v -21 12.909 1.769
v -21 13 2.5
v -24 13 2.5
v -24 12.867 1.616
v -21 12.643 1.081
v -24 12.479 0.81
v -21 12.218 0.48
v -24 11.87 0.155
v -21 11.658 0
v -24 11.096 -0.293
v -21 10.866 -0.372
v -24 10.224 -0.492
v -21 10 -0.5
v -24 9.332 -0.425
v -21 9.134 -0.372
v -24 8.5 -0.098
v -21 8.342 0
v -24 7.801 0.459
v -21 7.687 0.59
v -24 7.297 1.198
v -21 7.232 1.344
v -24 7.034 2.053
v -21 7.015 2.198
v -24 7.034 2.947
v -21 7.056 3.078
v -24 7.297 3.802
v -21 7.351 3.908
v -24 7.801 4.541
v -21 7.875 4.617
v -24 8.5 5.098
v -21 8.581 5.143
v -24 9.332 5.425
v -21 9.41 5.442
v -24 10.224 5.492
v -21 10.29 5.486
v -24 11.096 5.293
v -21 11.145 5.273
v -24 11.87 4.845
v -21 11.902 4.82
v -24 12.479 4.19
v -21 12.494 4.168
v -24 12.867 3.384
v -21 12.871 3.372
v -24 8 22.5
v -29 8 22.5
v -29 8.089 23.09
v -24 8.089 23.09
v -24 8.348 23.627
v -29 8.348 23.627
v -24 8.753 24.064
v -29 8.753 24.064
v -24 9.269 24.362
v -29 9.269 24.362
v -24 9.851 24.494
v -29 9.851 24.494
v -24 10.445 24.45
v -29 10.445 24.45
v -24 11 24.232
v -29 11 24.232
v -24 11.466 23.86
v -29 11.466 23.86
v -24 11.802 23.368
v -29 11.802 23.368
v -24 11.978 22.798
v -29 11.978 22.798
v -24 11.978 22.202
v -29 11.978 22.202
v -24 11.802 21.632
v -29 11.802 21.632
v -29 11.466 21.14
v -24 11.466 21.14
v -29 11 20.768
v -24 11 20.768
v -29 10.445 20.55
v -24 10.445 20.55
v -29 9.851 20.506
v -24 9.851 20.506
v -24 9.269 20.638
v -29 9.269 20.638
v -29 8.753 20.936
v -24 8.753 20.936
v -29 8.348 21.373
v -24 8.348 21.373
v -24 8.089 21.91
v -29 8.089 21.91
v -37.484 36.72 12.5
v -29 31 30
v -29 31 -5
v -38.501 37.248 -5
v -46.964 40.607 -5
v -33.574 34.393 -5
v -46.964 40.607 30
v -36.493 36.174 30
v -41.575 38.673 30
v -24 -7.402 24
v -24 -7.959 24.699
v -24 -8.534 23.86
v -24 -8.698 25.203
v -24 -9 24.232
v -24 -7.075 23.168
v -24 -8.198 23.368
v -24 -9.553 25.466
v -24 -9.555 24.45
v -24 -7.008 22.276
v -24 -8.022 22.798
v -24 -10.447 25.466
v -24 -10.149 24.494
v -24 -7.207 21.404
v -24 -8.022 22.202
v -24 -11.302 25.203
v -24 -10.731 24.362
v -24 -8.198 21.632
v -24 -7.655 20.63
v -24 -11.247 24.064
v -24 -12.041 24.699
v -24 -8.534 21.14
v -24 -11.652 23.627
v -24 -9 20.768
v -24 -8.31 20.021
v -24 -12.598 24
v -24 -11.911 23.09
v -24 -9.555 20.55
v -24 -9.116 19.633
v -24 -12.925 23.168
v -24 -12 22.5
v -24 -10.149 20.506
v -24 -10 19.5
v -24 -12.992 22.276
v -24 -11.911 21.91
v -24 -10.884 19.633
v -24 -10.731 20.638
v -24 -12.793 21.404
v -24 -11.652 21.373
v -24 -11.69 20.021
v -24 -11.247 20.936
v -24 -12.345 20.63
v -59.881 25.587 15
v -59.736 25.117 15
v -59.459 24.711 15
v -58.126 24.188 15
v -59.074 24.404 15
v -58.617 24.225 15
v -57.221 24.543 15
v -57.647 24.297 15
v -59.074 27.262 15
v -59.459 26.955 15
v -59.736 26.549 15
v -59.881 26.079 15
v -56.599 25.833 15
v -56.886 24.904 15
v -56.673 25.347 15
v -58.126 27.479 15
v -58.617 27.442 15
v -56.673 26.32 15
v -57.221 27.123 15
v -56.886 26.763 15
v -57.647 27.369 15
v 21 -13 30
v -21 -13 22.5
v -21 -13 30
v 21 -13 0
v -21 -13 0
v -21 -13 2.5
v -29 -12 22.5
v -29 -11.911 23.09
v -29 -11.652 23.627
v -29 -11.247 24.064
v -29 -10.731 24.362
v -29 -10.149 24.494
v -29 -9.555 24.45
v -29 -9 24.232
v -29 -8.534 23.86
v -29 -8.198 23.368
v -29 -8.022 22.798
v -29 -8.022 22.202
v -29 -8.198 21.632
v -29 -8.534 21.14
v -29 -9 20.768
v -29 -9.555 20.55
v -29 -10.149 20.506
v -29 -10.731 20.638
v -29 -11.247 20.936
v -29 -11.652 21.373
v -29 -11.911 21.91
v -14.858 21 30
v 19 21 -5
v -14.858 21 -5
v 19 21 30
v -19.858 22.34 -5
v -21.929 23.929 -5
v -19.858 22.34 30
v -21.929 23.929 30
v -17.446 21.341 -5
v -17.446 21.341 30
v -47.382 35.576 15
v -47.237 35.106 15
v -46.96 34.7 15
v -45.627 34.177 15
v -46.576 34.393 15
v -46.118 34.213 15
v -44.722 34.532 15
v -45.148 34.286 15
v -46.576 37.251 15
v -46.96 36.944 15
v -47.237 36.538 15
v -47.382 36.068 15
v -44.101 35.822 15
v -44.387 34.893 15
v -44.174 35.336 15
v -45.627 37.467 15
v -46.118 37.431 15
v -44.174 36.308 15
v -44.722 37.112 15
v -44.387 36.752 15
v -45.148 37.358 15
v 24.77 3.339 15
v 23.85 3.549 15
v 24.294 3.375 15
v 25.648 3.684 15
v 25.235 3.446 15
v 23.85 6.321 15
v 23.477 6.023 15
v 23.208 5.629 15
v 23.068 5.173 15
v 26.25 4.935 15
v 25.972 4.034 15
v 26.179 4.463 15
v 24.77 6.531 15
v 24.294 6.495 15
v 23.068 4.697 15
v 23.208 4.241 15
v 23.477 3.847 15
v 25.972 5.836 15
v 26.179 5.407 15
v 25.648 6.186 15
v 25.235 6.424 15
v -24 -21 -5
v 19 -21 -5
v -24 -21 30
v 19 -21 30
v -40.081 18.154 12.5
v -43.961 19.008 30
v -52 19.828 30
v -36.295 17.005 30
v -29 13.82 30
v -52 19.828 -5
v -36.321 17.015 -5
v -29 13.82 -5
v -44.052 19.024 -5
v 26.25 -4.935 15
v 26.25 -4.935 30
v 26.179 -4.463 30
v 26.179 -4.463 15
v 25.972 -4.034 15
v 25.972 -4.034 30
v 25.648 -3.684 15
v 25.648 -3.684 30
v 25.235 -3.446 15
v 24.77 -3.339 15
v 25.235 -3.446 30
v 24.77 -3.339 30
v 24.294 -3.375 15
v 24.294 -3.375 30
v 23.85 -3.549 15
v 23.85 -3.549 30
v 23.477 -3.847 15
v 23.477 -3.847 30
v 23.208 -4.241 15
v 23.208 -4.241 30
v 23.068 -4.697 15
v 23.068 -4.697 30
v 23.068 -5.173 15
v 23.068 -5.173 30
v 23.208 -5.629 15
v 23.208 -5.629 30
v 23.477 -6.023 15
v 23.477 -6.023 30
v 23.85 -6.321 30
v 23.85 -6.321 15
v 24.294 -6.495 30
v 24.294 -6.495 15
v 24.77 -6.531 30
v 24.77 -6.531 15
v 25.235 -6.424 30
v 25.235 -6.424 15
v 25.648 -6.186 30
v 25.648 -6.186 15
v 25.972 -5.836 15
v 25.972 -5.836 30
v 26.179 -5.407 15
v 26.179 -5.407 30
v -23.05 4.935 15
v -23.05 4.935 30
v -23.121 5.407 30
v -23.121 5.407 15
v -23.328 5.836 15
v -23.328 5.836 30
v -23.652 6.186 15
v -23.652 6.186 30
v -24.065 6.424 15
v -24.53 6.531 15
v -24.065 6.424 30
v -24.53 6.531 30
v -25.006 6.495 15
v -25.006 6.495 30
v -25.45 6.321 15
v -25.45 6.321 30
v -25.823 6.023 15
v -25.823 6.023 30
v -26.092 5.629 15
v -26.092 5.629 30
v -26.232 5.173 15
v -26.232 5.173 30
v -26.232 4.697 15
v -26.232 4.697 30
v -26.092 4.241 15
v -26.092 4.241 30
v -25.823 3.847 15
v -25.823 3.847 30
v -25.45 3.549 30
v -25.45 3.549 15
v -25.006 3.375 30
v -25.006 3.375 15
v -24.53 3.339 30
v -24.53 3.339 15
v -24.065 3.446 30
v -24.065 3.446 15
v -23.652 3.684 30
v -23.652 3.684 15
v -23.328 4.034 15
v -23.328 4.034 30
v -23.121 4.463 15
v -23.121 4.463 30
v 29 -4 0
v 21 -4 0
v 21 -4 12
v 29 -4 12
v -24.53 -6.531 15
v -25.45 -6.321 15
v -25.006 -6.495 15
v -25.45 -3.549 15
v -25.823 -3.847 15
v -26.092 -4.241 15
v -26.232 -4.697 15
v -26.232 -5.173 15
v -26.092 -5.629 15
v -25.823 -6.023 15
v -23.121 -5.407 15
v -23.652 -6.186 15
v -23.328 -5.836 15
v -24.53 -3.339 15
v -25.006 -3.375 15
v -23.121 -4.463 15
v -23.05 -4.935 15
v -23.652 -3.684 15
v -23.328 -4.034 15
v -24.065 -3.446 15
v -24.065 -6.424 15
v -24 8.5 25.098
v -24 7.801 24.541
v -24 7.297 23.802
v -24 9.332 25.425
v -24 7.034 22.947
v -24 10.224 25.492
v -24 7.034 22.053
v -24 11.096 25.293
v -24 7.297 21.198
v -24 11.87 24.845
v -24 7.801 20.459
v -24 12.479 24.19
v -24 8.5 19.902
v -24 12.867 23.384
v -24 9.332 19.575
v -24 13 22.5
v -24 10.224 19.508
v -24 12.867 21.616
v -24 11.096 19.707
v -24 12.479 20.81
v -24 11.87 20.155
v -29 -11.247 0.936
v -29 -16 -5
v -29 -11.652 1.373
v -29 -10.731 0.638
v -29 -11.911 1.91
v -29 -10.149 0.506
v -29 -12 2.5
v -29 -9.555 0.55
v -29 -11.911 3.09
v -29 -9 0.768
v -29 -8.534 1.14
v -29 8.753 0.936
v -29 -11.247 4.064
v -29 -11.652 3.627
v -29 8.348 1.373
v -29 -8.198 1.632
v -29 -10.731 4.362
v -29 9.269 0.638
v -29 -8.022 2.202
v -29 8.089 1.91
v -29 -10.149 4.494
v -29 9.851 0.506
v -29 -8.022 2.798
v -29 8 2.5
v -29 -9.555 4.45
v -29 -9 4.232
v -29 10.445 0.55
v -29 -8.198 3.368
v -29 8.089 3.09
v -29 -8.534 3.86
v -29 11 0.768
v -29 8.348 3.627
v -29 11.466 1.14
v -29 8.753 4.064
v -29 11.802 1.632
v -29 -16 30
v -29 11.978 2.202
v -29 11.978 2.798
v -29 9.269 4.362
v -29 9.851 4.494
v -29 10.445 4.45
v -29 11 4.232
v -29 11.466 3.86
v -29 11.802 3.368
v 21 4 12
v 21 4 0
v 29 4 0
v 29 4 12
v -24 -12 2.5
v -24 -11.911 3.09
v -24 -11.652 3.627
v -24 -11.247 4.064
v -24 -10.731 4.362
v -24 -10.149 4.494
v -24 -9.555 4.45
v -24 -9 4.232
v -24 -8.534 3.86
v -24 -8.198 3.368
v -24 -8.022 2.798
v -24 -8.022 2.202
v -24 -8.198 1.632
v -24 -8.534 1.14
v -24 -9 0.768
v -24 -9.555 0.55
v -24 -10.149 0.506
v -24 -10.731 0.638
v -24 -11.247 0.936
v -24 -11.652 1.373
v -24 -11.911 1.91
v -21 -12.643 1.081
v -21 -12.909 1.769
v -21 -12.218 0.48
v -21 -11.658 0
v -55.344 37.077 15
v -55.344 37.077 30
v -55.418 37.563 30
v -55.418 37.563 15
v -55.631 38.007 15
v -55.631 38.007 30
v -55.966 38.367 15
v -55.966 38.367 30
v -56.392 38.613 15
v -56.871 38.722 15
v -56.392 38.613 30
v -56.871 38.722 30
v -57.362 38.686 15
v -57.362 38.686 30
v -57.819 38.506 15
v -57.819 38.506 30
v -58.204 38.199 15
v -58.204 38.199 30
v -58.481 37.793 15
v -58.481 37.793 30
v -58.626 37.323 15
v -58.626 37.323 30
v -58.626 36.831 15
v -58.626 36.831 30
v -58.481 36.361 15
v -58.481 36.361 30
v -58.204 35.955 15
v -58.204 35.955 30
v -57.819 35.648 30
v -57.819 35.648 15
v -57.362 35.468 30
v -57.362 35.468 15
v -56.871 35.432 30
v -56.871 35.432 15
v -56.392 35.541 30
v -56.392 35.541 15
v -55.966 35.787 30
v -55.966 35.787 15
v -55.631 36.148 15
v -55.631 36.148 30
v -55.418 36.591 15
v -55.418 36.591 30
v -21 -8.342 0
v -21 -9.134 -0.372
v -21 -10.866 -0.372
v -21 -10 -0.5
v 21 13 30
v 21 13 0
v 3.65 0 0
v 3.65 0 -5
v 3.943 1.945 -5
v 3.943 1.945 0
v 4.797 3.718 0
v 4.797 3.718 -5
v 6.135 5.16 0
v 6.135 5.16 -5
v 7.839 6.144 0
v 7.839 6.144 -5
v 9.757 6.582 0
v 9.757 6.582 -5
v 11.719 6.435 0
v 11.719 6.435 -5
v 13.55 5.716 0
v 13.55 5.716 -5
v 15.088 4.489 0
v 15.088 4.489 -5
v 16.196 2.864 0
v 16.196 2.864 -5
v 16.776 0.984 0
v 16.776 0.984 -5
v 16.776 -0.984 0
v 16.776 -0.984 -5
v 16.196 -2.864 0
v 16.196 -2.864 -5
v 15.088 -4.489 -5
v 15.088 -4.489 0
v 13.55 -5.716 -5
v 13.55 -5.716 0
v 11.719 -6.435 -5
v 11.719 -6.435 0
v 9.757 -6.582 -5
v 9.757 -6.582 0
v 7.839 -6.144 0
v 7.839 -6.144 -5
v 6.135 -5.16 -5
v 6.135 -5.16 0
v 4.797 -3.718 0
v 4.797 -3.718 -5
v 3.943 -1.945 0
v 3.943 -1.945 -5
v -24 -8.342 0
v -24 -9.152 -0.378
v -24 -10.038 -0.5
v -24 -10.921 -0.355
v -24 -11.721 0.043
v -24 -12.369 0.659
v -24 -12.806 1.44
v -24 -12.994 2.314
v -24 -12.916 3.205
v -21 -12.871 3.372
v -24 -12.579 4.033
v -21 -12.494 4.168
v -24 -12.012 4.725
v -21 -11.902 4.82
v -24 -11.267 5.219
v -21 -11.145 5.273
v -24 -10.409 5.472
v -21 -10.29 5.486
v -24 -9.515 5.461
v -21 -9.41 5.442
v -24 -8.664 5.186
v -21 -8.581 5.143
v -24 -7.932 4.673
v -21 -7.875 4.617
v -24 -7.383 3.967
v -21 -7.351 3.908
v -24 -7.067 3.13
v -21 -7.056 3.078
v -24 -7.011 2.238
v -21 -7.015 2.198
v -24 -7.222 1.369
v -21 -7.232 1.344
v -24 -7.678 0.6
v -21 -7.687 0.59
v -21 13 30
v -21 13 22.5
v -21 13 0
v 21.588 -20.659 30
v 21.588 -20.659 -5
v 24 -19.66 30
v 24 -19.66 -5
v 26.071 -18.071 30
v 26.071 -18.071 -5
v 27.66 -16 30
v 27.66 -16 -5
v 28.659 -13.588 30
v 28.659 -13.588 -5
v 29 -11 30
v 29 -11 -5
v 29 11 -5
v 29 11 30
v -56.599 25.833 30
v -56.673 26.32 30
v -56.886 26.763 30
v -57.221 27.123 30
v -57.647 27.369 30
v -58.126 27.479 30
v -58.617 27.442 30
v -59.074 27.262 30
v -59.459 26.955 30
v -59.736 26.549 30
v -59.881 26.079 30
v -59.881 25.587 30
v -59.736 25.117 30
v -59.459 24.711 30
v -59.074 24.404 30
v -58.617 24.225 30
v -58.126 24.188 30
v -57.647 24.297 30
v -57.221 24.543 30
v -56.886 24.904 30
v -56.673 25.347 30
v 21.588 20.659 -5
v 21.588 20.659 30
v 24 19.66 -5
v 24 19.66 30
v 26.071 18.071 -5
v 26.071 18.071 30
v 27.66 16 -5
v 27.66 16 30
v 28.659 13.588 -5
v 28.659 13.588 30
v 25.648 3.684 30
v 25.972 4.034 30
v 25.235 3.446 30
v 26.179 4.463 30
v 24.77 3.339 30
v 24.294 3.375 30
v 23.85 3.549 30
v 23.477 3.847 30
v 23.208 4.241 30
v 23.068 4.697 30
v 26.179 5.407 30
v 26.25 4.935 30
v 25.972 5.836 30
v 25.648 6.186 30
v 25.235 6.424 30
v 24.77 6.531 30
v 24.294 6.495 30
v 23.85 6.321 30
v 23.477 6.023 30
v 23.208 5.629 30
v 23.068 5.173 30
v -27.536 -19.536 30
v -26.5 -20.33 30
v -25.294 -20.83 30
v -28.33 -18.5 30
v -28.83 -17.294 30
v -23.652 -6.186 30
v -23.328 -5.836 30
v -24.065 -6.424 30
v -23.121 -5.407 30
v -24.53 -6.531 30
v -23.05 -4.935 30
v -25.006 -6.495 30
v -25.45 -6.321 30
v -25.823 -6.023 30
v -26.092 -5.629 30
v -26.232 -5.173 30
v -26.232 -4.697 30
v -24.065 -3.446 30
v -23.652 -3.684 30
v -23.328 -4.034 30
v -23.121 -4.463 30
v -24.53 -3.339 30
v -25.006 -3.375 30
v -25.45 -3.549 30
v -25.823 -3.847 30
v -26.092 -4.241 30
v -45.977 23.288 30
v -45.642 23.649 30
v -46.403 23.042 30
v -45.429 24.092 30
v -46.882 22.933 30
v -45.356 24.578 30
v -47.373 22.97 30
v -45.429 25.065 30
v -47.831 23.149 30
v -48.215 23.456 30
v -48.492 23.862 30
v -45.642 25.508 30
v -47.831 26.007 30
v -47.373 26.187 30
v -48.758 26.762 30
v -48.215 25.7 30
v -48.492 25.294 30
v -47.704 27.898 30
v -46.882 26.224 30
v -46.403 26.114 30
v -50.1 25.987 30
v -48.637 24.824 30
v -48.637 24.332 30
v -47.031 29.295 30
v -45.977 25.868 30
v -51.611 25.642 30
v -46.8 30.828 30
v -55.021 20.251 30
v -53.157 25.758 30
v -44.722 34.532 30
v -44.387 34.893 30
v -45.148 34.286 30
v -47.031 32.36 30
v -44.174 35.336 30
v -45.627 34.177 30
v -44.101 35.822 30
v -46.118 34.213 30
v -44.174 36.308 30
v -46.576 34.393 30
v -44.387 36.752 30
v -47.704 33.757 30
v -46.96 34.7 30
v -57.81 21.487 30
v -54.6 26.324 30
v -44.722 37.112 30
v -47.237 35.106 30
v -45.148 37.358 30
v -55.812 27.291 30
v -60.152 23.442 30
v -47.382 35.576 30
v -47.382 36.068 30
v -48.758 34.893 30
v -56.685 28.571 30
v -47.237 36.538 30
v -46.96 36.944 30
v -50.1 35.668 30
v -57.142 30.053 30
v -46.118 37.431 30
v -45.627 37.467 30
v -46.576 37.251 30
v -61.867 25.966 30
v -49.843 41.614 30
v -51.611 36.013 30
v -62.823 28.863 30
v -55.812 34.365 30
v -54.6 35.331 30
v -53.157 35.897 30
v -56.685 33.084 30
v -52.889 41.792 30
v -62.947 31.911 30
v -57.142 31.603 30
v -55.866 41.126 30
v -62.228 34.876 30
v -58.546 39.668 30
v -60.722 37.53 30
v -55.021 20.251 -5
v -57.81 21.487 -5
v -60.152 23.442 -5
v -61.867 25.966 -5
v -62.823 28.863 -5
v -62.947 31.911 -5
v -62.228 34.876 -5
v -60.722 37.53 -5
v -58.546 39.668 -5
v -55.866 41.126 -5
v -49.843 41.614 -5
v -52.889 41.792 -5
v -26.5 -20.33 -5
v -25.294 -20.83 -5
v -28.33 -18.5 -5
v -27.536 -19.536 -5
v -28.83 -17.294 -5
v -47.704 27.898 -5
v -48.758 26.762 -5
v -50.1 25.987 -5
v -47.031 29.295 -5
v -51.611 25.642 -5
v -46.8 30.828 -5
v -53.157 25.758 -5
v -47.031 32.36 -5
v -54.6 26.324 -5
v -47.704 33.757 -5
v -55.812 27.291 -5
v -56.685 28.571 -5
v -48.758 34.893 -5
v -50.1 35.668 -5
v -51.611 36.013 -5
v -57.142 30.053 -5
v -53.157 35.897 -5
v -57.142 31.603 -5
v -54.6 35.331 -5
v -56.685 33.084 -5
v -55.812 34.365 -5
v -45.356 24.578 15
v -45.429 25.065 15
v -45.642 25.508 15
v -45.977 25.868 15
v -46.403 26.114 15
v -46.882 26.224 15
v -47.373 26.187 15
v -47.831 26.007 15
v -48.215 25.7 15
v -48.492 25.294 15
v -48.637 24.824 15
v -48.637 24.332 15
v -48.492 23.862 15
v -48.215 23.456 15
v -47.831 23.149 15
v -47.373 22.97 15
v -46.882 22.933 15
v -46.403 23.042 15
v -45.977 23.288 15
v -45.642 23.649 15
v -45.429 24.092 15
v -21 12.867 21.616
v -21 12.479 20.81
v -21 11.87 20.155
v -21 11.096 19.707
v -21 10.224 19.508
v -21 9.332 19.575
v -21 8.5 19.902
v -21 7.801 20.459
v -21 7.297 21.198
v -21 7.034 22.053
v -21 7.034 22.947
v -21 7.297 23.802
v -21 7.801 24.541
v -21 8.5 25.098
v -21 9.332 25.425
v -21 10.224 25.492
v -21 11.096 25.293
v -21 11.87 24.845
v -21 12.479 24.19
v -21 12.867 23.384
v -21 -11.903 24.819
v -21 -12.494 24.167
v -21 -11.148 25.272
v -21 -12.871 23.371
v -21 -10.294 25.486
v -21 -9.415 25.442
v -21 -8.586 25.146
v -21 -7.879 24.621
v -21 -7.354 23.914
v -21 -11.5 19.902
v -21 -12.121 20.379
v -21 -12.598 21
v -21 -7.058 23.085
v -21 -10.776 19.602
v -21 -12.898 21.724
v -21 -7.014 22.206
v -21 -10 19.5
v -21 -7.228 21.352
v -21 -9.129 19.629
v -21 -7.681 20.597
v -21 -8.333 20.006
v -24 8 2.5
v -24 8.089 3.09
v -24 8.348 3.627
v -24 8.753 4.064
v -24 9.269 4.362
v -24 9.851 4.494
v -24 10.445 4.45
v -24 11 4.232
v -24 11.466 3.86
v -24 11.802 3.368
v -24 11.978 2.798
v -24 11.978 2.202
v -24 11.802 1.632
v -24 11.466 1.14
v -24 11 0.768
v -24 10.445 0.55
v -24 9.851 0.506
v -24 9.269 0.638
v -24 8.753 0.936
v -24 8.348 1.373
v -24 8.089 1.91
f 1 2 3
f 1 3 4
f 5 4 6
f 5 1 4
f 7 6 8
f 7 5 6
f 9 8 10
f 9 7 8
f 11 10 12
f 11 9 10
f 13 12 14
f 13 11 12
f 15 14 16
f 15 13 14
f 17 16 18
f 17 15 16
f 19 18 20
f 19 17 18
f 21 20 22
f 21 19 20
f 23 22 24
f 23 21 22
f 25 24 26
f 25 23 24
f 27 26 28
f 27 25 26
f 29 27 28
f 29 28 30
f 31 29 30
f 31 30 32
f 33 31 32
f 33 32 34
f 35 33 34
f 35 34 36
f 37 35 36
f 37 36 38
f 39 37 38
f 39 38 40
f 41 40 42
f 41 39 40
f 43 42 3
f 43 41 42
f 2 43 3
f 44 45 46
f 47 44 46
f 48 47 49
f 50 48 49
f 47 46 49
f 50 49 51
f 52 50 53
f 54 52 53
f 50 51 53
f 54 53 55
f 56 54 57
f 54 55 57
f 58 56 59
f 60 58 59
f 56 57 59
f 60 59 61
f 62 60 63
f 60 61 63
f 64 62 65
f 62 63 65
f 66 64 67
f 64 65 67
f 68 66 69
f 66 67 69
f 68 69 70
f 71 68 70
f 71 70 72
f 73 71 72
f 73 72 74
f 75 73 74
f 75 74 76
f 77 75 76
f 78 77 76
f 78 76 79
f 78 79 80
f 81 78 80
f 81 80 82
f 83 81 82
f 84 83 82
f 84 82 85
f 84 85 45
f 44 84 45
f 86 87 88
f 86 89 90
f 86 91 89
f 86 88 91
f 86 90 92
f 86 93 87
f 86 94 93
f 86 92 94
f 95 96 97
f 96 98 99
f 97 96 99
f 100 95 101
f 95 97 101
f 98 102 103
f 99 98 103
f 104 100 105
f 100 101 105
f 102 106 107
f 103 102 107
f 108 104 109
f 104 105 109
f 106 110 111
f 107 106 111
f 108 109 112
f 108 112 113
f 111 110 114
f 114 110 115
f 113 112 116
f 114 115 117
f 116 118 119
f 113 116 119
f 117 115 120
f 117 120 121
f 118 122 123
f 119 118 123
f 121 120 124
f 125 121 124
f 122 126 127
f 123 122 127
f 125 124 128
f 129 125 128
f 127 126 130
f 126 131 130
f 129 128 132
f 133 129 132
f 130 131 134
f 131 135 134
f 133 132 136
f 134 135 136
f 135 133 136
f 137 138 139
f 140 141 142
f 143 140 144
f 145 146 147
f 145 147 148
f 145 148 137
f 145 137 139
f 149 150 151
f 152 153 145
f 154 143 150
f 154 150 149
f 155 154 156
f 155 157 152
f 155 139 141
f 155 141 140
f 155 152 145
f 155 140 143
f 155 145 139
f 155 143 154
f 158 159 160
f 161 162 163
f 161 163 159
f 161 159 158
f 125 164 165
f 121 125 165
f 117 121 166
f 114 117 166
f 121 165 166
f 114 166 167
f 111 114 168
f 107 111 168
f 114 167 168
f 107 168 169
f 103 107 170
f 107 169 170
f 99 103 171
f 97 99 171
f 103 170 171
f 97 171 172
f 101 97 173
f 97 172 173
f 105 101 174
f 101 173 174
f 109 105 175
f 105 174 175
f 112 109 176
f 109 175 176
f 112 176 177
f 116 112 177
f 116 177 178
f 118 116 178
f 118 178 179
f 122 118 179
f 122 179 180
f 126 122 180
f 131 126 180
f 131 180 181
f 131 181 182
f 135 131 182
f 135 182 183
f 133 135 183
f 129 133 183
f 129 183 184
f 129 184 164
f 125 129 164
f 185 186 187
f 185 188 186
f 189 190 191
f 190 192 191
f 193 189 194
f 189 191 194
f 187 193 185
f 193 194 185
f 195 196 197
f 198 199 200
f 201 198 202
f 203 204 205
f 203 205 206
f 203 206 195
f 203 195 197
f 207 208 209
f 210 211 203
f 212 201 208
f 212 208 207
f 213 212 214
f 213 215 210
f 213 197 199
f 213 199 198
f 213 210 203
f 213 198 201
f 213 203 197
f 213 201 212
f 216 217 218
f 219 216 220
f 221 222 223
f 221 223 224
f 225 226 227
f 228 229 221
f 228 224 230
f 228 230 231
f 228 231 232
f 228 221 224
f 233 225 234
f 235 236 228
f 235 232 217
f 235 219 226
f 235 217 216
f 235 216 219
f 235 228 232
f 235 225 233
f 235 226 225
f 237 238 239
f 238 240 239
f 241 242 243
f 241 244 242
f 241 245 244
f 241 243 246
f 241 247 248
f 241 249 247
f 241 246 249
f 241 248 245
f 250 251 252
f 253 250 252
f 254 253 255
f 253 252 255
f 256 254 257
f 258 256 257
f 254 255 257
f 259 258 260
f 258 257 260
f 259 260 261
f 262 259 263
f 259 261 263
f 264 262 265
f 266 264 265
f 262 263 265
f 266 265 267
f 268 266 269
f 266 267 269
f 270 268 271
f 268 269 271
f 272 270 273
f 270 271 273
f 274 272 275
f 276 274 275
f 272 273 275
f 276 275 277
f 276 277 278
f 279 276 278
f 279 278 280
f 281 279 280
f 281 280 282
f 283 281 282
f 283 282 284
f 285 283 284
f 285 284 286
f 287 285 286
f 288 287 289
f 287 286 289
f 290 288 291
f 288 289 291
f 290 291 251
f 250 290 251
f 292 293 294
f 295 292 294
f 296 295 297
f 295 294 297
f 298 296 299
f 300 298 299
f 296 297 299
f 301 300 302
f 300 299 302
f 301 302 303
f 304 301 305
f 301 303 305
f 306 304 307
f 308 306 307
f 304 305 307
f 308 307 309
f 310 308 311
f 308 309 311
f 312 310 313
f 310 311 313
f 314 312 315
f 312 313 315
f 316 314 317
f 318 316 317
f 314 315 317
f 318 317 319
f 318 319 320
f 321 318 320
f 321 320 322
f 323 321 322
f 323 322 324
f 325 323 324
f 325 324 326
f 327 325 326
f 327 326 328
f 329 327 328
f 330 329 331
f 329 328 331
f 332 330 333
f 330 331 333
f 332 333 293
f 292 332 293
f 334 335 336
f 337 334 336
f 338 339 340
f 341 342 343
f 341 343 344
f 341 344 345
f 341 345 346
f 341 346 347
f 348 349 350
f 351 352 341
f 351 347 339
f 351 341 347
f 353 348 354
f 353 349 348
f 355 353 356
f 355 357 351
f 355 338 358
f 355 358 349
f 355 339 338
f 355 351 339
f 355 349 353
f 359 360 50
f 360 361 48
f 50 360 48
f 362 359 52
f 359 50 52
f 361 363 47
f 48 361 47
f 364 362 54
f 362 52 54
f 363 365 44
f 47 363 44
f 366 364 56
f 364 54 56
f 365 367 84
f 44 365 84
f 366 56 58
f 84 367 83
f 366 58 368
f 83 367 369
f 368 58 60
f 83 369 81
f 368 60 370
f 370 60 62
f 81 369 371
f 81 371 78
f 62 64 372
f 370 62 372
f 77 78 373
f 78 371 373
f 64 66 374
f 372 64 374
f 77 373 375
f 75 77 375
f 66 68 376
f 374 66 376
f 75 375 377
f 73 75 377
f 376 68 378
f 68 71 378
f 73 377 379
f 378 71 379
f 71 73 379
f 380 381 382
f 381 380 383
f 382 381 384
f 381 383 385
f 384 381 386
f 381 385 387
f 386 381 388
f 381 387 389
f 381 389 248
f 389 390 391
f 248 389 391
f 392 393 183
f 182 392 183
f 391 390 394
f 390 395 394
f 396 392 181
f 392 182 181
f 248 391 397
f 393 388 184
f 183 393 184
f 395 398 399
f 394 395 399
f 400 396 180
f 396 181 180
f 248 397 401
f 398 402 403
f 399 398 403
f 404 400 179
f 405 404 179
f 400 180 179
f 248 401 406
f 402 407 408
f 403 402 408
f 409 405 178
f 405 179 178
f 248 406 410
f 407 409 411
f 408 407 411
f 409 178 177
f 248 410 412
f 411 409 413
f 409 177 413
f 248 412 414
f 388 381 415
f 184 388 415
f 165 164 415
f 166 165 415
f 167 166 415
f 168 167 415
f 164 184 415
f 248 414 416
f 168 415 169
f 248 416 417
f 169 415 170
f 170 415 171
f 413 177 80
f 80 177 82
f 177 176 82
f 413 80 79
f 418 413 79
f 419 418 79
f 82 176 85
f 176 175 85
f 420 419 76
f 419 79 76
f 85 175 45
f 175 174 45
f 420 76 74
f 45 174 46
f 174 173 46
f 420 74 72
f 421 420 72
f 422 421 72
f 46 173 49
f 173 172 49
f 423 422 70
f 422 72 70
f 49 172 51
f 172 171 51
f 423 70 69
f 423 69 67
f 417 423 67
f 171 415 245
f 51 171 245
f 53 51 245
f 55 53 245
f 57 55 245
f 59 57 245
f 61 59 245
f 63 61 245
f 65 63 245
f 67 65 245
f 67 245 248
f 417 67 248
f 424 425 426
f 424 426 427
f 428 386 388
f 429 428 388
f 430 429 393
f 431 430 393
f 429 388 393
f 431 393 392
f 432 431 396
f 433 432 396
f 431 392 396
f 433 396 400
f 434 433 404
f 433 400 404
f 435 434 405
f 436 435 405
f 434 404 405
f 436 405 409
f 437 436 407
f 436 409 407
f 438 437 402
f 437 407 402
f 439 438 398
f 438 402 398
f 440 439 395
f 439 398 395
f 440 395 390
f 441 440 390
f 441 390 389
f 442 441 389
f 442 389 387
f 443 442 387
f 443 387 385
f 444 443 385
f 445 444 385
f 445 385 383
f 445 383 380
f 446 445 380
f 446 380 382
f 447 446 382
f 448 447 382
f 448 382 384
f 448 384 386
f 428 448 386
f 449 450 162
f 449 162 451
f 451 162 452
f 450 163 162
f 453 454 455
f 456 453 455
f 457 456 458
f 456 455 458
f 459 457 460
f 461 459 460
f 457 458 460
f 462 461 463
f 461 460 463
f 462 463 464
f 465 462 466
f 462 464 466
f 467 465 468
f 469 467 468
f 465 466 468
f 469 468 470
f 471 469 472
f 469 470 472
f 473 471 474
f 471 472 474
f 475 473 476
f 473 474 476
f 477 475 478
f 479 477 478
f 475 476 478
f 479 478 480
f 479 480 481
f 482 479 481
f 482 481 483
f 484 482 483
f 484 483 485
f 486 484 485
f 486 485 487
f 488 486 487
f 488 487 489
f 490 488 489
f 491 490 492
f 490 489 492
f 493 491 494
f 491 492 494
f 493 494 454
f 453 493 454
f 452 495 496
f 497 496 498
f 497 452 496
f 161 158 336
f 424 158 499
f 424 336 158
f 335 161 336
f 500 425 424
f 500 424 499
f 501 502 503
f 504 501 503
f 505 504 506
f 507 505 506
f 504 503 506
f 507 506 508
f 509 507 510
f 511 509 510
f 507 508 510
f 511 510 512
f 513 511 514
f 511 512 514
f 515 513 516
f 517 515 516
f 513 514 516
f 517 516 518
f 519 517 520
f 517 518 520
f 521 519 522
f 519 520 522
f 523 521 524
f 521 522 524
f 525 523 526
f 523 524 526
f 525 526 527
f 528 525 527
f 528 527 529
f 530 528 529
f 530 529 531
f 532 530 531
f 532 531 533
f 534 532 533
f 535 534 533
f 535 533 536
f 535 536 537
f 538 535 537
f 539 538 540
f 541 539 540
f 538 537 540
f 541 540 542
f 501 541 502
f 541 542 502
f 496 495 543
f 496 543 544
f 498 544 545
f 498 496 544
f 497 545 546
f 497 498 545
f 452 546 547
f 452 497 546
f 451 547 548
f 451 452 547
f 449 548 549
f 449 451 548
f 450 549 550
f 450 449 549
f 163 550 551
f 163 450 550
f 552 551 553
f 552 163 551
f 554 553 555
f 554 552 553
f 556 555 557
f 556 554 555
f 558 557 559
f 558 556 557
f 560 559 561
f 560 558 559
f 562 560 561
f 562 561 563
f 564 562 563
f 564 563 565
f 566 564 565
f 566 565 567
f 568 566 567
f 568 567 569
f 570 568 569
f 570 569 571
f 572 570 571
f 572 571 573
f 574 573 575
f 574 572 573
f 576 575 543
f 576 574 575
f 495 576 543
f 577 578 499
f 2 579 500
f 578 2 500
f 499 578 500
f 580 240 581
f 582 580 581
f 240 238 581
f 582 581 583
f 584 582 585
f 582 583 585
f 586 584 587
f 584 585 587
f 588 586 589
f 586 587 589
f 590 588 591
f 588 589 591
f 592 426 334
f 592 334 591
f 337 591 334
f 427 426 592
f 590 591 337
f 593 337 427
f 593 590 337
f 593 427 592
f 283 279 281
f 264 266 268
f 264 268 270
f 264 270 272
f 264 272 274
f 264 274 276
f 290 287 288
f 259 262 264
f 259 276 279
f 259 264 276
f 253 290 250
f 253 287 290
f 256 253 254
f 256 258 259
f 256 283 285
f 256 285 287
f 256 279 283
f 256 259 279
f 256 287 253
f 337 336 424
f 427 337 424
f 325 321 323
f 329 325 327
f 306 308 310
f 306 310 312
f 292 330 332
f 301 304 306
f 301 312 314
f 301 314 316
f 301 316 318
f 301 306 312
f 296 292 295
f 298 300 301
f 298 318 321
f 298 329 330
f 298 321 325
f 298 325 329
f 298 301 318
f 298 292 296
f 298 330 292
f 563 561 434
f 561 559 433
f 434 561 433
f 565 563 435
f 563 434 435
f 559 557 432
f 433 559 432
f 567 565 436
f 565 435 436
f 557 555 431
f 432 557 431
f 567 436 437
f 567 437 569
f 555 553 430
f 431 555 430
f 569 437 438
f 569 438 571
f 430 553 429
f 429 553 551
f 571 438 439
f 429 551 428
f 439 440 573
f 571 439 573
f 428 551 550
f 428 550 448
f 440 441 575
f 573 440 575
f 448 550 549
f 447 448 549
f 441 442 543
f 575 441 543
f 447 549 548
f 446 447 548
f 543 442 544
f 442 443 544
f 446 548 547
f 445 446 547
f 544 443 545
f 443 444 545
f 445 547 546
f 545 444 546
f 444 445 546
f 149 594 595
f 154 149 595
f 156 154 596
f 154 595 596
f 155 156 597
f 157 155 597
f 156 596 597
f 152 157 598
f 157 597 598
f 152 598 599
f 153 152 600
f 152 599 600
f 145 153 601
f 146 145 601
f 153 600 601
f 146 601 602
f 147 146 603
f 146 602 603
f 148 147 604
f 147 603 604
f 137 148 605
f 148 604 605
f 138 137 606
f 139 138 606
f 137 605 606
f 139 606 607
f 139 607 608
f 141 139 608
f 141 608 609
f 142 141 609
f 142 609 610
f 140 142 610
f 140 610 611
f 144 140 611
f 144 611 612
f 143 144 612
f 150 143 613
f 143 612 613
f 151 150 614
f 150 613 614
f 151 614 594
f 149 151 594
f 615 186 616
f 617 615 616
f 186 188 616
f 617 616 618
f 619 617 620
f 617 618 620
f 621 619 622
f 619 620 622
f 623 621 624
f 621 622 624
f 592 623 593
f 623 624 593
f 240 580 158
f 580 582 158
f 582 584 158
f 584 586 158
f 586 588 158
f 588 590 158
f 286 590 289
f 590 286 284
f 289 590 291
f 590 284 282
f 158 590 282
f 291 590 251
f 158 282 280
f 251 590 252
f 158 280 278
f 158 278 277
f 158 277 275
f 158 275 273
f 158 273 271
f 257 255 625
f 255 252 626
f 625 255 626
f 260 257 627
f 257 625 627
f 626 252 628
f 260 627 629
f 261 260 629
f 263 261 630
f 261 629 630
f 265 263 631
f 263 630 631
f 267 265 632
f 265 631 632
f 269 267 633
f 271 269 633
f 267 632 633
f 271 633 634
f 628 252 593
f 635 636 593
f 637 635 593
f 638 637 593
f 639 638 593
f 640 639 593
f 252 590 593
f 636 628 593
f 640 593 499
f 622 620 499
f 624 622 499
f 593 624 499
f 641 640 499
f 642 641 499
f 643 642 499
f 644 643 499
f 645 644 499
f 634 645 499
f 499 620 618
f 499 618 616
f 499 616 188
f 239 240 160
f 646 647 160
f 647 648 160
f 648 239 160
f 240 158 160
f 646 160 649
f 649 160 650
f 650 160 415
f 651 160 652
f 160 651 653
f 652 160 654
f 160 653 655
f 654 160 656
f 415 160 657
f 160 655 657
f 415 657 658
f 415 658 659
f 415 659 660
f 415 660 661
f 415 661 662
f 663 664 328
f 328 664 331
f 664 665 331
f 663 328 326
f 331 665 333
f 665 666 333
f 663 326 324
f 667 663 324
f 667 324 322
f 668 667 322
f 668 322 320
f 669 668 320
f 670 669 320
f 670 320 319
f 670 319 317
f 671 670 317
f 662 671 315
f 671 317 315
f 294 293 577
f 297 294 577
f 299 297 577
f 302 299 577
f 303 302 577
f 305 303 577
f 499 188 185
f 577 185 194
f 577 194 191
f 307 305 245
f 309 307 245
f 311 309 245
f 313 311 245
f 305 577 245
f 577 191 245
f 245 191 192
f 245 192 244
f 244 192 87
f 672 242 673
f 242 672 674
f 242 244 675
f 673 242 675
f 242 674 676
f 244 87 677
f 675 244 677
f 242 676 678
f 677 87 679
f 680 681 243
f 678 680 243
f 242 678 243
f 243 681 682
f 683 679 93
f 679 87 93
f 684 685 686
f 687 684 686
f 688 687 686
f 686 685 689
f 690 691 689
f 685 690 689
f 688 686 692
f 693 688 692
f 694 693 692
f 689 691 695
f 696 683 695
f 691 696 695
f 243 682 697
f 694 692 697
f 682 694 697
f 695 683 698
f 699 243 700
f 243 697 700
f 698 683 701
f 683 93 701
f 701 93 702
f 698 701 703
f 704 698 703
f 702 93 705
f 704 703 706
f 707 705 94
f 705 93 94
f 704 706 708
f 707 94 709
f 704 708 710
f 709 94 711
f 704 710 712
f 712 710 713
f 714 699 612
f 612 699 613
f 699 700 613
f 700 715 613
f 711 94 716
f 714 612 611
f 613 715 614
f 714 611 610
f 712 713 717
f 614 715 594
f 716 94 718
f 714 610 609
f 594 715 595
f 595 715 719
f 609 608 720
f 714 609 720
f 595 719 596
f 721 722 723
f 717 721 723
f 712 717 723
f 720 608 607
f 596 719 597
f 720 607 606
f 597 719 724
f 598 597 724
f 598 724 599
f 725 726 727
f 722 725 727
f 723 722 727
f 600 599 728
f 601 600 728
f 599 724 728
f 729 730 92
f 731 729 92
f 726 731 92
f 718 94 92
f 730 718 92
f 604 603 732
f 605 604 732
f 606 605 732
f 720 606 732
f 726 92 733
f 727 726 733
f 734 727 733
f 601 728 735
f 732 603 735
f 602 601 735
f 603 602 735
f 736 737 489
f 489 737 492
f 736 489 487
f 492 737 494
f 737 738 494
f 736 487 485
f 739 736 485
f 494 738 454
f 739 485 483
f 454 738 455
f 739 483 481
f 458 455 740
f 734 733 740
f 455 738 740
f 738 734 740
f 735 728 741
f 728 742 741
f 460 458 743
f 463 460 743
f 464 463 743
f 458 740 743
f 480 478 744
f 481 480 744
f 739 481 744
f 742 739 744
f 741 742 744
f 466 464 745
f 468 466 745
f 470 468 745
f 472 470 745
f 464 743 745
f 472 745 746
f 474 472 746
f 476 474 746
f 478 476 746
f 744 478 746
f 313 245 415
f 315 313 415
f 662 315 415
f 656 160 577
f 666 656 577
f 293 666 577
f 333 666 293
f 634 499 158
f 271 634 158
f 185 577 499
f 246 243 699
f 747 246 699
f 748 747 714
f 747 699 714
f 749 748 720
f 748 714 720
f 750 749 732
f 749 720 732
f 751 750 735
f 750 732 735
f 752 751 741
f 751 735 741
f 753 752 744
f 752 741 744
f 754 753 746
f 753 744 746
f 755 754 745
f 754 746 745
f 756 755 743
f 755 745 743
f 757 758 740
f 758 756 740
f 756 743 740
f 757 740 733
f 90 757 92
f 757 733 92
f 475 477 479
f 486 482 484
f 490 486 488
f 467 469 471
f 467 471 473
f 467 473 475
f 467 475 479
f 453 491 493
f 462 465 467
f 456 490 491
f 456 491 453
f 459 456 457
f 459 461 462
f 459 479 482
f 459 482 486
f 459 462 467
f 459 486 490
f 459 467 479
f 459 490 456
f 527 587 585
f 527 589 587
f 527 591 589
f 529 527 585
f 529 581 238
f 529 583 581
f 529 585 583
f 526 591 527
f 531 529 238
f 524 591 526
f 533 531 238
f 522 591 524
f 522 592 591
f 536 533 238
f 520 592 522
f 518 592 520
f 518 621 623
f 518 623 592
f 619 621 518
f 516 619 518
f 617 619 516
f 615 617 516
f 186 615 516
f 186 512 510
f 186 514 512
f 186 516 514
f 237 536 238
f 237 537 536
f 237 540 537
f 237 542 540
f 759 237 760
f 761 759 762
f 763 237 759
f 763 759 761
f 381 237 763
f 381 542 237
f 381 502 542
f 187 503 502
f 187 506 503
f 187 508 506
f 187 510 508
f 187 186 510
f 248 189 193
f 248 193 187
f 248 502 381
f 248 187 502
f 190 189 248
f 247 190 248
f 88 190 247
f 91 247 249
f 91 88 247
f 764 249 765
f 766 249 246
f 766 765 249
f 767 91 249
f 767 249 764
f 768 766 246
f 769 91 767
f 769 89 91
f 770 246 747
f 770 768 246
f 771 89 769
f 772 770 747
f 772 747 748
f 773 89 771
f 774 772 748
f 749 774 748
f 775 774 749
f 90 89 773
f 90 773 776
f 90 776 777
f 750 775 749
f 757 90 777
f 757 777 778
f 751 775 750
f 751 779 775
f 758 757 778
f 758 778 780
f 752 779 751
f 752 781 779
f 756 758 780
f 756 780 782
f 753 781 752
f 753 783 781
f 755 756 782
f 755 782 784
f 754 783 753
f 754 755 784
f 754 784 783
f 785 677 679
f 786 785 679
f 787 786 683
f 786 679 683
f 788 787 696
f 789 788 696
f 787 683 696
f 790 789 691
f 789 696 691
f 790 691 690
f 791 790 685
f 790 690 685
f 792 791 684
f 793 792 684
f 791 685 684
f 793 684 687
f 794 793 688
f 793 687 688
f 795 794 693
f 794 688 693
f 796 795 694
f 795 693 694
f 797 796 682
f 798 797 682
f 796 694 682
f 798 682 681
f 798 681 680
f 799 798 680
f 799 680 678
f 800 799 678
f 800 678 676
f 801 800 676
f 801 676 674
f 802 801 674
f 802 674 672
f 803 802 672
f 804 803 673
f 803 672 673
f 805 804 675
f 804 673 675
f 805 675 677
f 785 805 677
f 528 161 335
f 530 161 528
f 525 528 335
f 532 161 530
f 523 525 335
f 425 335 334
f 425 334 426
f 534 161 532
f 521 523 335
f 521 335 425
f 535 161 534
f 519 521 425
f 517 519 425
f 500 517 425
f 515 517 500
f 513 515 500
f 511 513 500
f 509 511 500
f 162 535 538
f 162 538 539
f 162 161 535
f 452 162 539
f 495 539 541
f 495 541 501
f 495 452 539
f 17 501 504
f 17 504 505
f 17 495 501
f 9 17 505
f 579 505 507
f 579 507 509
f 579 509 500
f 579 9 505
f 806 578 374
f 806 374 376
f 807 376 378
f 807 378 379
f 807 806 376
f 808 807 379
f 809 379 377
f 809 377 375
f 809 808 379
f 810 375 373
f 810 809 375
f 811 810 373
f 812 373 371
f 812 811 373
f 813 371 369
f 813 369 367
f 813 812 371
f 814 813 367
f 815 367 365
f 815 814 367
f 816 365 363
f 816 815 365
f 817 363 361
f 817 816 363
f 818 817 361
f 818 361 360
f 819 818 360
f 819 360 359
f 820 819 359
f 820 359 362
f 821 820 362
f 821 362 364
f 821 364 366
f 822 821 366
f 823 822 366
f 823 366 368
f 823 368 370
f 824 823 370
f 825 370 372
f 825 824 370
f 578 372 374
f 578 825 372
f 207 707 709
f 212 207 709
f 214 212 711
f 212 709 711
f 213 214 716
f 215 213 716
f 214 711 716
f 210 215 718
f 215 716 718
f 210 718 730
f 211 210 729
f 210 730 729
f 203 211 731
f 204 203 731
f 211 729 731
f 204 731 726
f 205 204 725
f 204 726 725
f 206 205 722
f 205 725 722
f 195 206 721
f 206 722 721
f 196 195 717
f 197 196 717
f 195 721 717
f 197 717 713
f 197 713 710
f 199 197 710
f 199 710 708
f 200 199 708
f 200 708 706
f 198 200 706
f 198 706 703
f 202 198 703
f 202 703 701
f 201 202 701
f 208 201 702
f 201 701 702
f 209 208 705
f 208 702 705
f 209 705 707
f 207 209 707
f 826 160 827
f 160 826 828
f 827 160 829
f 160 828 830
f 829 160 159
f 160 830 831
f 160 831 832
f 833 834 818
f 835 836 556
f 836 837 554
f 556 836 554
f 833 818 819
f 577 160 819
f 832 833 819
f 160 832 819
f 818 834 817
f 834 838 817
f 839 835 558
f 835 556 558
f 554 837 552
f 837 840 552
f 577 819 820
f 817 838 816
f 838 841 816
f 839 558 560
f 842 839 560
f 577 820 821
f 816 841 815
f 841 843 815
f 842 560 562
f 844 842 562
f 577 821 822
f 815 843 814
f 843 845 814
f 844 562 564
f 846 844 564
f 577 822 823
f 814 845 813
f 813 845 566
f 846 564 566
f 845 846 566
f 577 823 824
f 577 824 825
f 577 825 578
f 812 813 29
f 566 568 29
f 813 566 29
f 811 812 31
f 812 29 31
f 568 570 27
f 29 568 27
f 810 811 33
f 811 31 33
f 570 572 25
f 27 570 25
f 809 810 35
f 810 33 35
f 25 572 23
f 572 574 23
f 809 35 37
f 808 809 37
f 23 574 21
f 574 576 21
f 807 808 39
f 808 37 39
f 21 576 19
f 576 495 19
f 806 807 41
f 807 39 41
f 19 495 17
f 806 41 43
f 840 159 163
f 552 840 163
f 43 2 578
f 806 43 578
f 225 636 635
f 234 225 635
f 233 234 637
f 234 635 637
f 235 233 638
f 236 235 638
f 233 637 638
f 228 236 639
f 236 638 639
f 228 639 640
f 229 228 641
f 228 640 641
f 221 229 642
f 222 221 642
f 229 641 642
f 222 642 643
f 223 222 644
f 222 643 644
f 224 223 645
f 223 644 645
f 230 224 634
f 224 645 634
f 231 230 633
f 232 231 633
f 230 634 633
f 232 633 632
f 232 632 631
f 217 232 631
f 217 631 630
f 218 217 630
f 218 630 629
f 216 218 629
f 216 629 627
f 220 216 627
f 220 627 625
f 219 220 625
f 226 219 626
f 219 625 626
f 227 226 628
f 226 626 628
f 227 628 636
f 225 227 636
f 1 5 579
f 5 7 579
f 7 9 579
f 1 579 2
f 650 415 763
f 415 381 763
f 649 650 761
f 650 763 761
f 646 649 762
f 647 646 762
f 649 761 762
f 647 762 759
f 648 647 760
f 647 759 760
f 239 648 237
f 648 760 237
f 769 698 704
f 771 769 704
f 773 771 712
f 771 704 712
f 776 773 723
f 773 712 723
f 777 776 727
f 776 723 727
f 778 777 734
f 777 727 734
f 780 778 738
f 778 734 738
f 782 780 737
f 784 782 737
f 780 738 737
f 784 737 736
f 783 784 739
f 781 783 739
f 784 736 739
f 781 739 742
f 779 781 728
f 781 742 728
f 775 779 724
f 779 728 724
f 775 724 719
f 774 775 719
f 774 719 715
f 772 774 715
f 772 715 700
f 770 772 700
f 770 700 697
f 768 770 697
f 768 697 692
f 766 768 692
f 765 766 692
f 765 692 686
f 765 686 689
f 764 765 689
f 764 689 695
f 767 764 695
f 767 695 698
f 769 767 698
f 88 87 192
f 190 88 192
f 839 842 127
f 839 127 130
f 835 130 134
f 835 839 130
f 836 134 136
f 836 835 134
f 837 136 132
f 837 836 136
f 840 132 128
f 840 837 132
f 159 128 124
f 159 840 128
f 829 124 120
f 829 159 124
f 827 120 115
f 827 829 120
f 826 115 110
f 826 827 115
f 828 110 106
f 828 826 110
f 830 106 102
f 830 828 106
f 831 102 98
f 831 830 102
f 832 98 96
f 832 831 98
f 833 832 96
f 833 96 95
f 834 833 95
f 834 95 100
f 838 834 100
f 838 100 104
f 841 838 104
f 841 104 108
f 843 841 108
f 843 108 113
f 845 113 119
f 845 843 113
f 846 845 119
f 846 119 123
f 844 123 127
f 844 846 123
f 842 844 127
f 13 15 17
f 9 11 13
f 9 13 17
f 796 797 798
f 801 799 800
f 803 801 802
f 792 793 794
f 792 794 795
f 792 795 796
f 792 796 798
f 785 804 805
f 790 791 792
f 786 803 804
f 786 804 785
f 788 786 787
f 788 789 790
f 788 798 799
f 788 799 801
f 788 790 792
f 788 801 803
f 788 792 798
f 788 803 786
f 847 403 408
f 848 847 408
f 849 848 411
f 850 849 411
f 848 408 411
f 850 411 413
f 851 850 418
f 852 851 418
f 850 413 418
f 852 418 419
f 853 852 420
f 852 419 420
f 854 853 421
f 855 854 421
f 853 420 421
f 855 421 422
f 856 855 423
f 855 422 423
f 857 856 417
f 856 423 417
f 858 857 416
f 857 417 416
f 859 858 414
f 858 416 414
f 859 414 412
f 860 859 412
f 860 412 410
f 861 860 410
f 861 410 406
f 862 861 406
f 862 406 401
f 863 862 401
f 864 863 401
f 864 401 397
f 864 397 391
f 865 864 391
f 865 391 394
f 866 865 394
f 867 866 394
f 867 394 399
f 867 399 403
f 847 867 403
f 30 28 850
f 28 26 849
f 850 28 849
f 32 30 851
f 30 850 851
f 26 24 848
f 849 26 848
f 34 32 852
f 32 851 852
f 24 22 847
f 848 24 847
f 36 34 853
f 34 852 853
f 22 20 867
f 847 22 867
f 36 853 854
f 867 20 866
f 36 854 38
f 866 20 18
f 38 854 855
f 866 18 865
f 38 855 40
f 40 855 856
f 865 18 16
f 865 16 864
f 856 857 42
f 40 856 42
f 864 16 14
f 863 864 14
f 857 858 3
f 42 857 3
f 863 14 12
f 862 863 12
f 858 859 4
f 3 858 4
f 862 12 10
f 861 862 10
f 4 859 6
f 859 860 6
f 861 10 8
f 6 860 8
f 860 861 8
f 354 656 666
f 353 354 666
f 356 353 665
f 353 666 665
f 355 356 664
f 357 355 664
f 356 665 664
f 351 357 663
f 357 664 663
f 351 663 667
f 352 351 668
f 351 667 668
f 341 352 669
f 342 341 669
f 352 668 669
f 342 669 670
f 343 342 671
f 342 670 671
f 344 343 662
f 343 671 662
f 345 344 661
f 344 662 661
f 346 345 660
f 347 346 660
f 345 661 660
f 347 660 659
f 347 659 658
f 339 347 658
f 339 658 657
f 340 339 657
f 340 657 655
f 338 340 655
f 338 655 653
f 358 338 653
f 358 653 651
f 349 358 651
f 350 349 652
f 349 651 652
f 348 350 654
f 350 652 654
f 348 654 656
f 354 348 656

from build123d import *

# Parameters (mm, degrees)
SKETCH1_W           = 58
SKETCH1_H           = 42
SKETCH1_W_2         = 42
SKETCH1_H_2         = 26
BOSS_EXTRUDE1_DEPTH = 30
SKETCH2_W           = 58
SKETCH2_H           = 42
BOSS_EXTRUDE2_DEPTH = 5
SKETCH4_R           = 1.75
CUT_EXTRUDE2_DEPTH  = 8
SKETCH5_R           = 1.75
CUT_EXTRUDE3_DEPTH  = 8
SKETCH6_R           = 2
CUT_EXTRUDE4_DEPTH  = 8
CUT_EXTRUDE5_START  = 42
SKETCH7_R           = 3
CUT_EXTRUDE5_DEPTH  = 3
SKETCH8_W           = 38.12950039
SKETCH8_H           = 31.187364713
BOSS_EXTRUDE3_DEPTH = 35
SKETCH9_R           = 5.2
CUT_EXTRUDE6_DEPTH  = 89.074186757
SKETCH10_R          = 1.65
CUT_EXTRUDE7_DEPTH  = 15
FILLET1_R           = 10
CUT_EXTRUDE8_DEPTH  = 89.074186757
BOSS_EXTRUDE4_DEPTH = 35
FILLET2_R           = 10
SKETCH13_R          = 1.6
CUT_EXTRUDE9_DEPTH  = 15
SKETCH14_R          = 6.6
CUT_EXTRUDE10_DEPTH = 5
SKETCH15_W          = 12
SKETCH15_H          = 8
CUT_EXTRUDE11_DEPTH = 99.51675752
FILLET3_R           = 5


with BuildPart() as part:
    # Sketch1 → Boss-Extrude1 (new body)
    with BuildSketch(Plane.XY):
        Rectangle(SKETCH1_W, SKETCH1_H)
        Rectangle(SKETCH1_W_2, SKETCH1_H_2, mode=Mode.SUBTRACT)
    extrude(amount=BOSS_EXTRUDE1_DEPTH)

    # Sketch2 → Boss-Extrude2 (add)
    with BuildSketch(Plane(origin=(0, 0, 0), x_dir=(-1, 0, 0), z_dir=(0, 0, -1))):
        Rectangle(SKETCH2_W, SKETCH2_H)
    extrude(amount=BOSS_EXTRUDE2_DEPTH)

    # Sketch4 → Cut-Extrude2 (cut)
    with BuildSketch(Plane.ZY.offset(29)):
        with Locations(Location((22.5, 10, 0), (0, 0, 270))):
            Circle(SKETCH4_R)
        with Locations(Location((22.5, -10, 0), (0, 0, 270))):
            Circle(SKETCH4_R)
    extrude(amount=-CUT_EXTRUDE2_DEPTH, mode=Mode.SUBTRACT)

    # Sketch5 → Cut-Extrude3 (cut)
    with BuildSketch(Plane.ZY.offset(29)):
        with Locations(Location((2.5, 10, 0), (0, 0, 270))):
            Circle(SKETCH5_R)
        with Locations(Location((2.5, -10, 0), (0, 0, 270))):
            Circle(SKETCH5_R)
    extrude(amount=-CUT_EXTRUDE3_DEPTH, mode=Mode.SUBTRACT)

    # Sketch6 → Cut-Extrude4 (cut)
    with BuildSketch(Plane.ZY.offset(29)):
        with Locations(Location((22.5, 10, 0), (0, 0, 270))):
            Circle(SKETCH6_R)
        with Locations(Location((2.5, 10, 0), (0, 0, 270))):
            Circle(SKETCH6_R)
        with Locations(Location((2.5, -10, 0), (0, 0, 270))):
            Circle(SKETCH6_R)
        with Locations(Location((22.5, -10, 0), (0, 0, 270))):
            Circle(SKETCH6_R)
    extrude(amount=-CUT_EXTRUDE4_DEPTH, mode=Mode.SUBTRACT)

    # Sketch7 → Cut-Extrude5 (cut)
    with BuildSketch(Plane.ZY.offset(-21).offset(CUT_EXTRUDE5_START)):
        with Locations(Location((22.5, 10, 0), (0, 0, 90))):
            Circle(SKETCH7_R)
        with Locations(Location((22.5, -10, 0), (0, 0, 180))):
            Circle(SKETCH7_R)
        with Locations(Location((2.5, 10, 0), (0, 0, 90))):
            Circle(SKETCH7_R)
        with Locations(Location((2.5, -10, 0), (0, 0, 146.442690238))):
            Circle(SKETCH7_R)
    extrude(amount=CUT_EXTRUDE5_DEPTH, mode=Mode.SUBTRACT)

    # Sketch8 → Boss-Extrude3 (add)
    with BuildSketch(Plane.XY.offset(30)):
        with Locations((-48.064750195, 29.414011989)):
            Rectangle(SKETCH8_W, SKETCH8_H)
    extrude(amount=-BOSS_EXTRUDE3_DEPTH)

    # Sketch9 → Cut-Extrude6 (cut, through all)
    with BuildSketch(Plane.XY.offset(30)):
        with Locations((-52.000004001, 30.827632123)):
            Circle(SKETCH9_R)
    extrude(amount=-CUT_EXTRUDE6_DEPTH, mode=Mode.SUBTRACT)

    # Sketch10 → Cut-Extrude7 (cut)
    with BuildSketch(Plane.XY.offset(30)):
        with Locations((-45.750541353, 35.822050669)):
            Circle(SKETCH10_R)
        with Locations((-47.005585454, 24.578169475)):
            Circle(SKETCH10_R)
        with Locations((-56.994422547, 37.07709477)):
            Circle(SKETCH10_R)
        with Locations((-58.249466648, 25.833213576)):
            Circle(SKETCH10_R)
    extrude(amount=-CUT_EXTRUDE7_DEPTH, mode=Mode.SUBTRACT)

    # Fillet1
    fillet1_edges = [part.edges().sort_by_distance(p)[0] for p in [
        (-67.12950039, 45.007694345, 12.5),
        (-67.12950039, 13.820329632, 12.5),
        (-29, 45.007694345, 12.5),
        (-29, 21, 12.5),
        (29, 21, 12.5),
        (29, -21, 12.5),
    ]]
    fillet(fillet1_edges, radius=FILLET1_R)

    # Sketch11 → Cut-Extrude8 (cut, through all)
    with BuildSketch(Plane.XY.offset(30)):
        with BuildLine():
            Line((-57.12950039, 13.820329632), (-29, 13.820329632))
            add(Edge.make_bspline(
                [(-52.000004001, 19.827632123), (-39.662764049, 19.484687558), (-29, 13.820329632)],
                knots=[0, 0, 0, 1, 1, 1], degree=2))
            ThreePointArc((-52.000004001, 19.827632123), (-62.690470456, 33.418756776), (-46.963580148, 40.606918128))
            add(Edge.make_bspline(
                [(-29, 31), (-36.987178252, 37.635549332), (-46.963580148, 40.606918128)],
                knots=[0, 0, 0, 1, 1, 1], degree=2))
            Line((-29, 31), (-29, 35.007694345))
            ThreePointArc((-29, 35.007694345), (-31.928932188, 42.078762157), (-39, 45.007694345))
            Line((-39, 45.007694345), (-57.12950039, 45.007694345))
            ThreePointArc((-57.12950039, 45.007694345), (-64.200568202, 42.078762157), (-67.12950039, 35.007694345))
            Line((-67.12950039, 35.007694345), (-67.12950039, 23.820329632))
            ThreePointArc((-67.12950039, 23.820329632), (-64.200568202, 16.74926182), (-57.12950039, 13.820329632))
        make_face()
    extrude(amount=-CUT_EXTRUDE8_DEPTH, mode=Mode.SUBTRACT)

    # Sketch12 → Boss-Extrude4 (add)
    with BuildSketch(Plane.XY.offset(30)):
        with BuildLine():
            Line((-29, 31), (-19, 21))
            ThreePointArc((-19, 21), (-26.071067812, 23.928932188), (-29, 31))
        make_face()
    extrude(amount=-BOSS_EXTRUDE4_DEPTH)

    # Fillet2
    fillet2_edges = [part.edges().sort_by_distance(p)[0] for p in [
        (-19, 21, 12.5),
    ]]
    fillet(fillet2_edges, radius=FILLET2_R)

    # Sketch13 → Cut-Extrude9 (cut)
    with BuildSketch(Plane.XY.offset(30)):
        with Locations((24.65, 4.935)):
            Circle(SKETCH13_R)
        with Locations((24.65, -4.935)):
            Circle(SKETCH13_R)
        with Locations((-24.65, 4.935)):
            Circle(SKETCH13_R)
        with Locations((-24.65, -4.935)):
            Circle(SKETCH13_R)
    extrude(amount=-CUT_EXTRUDE9_DEPTH, mode=Mode.SUBTRACT)

    # Sketch14 → Cut-Extrude10 (cut)
    with BuildSketch(Plane(origin=(0, 0, -5), x_dir=(-1, 0, 0), z_dir=(0, 0, -1))):
        with Locations((-10.250000003, -1e-09)):
            Circle(SKETCH14_R)
    extrude(amount=-CUT_EXTRUDE10_DEPTH, mode=Mode.SUBTRACT)

    # Sketch15 → Cut-Extrude11 (cut, through all)
    with BuildSketch(Plane.ZY.offset(-21)):
        with Locations((6, 0)):
            Rectangle(SKETCH15_W, SKETCH15_H)
    extrude(amount=-CUT_EXTRUDE11_DEPTH, mode=Mode.SUBTRACT)

    # Fillet3
    fillet3_edges = [part.edges().sort_by_distance(p)[0] for p in [
        (-29, -21, 12.5),
    ]]
    fillet(fillet3_edges, radius=FILLET3_R)


solid = part.part
